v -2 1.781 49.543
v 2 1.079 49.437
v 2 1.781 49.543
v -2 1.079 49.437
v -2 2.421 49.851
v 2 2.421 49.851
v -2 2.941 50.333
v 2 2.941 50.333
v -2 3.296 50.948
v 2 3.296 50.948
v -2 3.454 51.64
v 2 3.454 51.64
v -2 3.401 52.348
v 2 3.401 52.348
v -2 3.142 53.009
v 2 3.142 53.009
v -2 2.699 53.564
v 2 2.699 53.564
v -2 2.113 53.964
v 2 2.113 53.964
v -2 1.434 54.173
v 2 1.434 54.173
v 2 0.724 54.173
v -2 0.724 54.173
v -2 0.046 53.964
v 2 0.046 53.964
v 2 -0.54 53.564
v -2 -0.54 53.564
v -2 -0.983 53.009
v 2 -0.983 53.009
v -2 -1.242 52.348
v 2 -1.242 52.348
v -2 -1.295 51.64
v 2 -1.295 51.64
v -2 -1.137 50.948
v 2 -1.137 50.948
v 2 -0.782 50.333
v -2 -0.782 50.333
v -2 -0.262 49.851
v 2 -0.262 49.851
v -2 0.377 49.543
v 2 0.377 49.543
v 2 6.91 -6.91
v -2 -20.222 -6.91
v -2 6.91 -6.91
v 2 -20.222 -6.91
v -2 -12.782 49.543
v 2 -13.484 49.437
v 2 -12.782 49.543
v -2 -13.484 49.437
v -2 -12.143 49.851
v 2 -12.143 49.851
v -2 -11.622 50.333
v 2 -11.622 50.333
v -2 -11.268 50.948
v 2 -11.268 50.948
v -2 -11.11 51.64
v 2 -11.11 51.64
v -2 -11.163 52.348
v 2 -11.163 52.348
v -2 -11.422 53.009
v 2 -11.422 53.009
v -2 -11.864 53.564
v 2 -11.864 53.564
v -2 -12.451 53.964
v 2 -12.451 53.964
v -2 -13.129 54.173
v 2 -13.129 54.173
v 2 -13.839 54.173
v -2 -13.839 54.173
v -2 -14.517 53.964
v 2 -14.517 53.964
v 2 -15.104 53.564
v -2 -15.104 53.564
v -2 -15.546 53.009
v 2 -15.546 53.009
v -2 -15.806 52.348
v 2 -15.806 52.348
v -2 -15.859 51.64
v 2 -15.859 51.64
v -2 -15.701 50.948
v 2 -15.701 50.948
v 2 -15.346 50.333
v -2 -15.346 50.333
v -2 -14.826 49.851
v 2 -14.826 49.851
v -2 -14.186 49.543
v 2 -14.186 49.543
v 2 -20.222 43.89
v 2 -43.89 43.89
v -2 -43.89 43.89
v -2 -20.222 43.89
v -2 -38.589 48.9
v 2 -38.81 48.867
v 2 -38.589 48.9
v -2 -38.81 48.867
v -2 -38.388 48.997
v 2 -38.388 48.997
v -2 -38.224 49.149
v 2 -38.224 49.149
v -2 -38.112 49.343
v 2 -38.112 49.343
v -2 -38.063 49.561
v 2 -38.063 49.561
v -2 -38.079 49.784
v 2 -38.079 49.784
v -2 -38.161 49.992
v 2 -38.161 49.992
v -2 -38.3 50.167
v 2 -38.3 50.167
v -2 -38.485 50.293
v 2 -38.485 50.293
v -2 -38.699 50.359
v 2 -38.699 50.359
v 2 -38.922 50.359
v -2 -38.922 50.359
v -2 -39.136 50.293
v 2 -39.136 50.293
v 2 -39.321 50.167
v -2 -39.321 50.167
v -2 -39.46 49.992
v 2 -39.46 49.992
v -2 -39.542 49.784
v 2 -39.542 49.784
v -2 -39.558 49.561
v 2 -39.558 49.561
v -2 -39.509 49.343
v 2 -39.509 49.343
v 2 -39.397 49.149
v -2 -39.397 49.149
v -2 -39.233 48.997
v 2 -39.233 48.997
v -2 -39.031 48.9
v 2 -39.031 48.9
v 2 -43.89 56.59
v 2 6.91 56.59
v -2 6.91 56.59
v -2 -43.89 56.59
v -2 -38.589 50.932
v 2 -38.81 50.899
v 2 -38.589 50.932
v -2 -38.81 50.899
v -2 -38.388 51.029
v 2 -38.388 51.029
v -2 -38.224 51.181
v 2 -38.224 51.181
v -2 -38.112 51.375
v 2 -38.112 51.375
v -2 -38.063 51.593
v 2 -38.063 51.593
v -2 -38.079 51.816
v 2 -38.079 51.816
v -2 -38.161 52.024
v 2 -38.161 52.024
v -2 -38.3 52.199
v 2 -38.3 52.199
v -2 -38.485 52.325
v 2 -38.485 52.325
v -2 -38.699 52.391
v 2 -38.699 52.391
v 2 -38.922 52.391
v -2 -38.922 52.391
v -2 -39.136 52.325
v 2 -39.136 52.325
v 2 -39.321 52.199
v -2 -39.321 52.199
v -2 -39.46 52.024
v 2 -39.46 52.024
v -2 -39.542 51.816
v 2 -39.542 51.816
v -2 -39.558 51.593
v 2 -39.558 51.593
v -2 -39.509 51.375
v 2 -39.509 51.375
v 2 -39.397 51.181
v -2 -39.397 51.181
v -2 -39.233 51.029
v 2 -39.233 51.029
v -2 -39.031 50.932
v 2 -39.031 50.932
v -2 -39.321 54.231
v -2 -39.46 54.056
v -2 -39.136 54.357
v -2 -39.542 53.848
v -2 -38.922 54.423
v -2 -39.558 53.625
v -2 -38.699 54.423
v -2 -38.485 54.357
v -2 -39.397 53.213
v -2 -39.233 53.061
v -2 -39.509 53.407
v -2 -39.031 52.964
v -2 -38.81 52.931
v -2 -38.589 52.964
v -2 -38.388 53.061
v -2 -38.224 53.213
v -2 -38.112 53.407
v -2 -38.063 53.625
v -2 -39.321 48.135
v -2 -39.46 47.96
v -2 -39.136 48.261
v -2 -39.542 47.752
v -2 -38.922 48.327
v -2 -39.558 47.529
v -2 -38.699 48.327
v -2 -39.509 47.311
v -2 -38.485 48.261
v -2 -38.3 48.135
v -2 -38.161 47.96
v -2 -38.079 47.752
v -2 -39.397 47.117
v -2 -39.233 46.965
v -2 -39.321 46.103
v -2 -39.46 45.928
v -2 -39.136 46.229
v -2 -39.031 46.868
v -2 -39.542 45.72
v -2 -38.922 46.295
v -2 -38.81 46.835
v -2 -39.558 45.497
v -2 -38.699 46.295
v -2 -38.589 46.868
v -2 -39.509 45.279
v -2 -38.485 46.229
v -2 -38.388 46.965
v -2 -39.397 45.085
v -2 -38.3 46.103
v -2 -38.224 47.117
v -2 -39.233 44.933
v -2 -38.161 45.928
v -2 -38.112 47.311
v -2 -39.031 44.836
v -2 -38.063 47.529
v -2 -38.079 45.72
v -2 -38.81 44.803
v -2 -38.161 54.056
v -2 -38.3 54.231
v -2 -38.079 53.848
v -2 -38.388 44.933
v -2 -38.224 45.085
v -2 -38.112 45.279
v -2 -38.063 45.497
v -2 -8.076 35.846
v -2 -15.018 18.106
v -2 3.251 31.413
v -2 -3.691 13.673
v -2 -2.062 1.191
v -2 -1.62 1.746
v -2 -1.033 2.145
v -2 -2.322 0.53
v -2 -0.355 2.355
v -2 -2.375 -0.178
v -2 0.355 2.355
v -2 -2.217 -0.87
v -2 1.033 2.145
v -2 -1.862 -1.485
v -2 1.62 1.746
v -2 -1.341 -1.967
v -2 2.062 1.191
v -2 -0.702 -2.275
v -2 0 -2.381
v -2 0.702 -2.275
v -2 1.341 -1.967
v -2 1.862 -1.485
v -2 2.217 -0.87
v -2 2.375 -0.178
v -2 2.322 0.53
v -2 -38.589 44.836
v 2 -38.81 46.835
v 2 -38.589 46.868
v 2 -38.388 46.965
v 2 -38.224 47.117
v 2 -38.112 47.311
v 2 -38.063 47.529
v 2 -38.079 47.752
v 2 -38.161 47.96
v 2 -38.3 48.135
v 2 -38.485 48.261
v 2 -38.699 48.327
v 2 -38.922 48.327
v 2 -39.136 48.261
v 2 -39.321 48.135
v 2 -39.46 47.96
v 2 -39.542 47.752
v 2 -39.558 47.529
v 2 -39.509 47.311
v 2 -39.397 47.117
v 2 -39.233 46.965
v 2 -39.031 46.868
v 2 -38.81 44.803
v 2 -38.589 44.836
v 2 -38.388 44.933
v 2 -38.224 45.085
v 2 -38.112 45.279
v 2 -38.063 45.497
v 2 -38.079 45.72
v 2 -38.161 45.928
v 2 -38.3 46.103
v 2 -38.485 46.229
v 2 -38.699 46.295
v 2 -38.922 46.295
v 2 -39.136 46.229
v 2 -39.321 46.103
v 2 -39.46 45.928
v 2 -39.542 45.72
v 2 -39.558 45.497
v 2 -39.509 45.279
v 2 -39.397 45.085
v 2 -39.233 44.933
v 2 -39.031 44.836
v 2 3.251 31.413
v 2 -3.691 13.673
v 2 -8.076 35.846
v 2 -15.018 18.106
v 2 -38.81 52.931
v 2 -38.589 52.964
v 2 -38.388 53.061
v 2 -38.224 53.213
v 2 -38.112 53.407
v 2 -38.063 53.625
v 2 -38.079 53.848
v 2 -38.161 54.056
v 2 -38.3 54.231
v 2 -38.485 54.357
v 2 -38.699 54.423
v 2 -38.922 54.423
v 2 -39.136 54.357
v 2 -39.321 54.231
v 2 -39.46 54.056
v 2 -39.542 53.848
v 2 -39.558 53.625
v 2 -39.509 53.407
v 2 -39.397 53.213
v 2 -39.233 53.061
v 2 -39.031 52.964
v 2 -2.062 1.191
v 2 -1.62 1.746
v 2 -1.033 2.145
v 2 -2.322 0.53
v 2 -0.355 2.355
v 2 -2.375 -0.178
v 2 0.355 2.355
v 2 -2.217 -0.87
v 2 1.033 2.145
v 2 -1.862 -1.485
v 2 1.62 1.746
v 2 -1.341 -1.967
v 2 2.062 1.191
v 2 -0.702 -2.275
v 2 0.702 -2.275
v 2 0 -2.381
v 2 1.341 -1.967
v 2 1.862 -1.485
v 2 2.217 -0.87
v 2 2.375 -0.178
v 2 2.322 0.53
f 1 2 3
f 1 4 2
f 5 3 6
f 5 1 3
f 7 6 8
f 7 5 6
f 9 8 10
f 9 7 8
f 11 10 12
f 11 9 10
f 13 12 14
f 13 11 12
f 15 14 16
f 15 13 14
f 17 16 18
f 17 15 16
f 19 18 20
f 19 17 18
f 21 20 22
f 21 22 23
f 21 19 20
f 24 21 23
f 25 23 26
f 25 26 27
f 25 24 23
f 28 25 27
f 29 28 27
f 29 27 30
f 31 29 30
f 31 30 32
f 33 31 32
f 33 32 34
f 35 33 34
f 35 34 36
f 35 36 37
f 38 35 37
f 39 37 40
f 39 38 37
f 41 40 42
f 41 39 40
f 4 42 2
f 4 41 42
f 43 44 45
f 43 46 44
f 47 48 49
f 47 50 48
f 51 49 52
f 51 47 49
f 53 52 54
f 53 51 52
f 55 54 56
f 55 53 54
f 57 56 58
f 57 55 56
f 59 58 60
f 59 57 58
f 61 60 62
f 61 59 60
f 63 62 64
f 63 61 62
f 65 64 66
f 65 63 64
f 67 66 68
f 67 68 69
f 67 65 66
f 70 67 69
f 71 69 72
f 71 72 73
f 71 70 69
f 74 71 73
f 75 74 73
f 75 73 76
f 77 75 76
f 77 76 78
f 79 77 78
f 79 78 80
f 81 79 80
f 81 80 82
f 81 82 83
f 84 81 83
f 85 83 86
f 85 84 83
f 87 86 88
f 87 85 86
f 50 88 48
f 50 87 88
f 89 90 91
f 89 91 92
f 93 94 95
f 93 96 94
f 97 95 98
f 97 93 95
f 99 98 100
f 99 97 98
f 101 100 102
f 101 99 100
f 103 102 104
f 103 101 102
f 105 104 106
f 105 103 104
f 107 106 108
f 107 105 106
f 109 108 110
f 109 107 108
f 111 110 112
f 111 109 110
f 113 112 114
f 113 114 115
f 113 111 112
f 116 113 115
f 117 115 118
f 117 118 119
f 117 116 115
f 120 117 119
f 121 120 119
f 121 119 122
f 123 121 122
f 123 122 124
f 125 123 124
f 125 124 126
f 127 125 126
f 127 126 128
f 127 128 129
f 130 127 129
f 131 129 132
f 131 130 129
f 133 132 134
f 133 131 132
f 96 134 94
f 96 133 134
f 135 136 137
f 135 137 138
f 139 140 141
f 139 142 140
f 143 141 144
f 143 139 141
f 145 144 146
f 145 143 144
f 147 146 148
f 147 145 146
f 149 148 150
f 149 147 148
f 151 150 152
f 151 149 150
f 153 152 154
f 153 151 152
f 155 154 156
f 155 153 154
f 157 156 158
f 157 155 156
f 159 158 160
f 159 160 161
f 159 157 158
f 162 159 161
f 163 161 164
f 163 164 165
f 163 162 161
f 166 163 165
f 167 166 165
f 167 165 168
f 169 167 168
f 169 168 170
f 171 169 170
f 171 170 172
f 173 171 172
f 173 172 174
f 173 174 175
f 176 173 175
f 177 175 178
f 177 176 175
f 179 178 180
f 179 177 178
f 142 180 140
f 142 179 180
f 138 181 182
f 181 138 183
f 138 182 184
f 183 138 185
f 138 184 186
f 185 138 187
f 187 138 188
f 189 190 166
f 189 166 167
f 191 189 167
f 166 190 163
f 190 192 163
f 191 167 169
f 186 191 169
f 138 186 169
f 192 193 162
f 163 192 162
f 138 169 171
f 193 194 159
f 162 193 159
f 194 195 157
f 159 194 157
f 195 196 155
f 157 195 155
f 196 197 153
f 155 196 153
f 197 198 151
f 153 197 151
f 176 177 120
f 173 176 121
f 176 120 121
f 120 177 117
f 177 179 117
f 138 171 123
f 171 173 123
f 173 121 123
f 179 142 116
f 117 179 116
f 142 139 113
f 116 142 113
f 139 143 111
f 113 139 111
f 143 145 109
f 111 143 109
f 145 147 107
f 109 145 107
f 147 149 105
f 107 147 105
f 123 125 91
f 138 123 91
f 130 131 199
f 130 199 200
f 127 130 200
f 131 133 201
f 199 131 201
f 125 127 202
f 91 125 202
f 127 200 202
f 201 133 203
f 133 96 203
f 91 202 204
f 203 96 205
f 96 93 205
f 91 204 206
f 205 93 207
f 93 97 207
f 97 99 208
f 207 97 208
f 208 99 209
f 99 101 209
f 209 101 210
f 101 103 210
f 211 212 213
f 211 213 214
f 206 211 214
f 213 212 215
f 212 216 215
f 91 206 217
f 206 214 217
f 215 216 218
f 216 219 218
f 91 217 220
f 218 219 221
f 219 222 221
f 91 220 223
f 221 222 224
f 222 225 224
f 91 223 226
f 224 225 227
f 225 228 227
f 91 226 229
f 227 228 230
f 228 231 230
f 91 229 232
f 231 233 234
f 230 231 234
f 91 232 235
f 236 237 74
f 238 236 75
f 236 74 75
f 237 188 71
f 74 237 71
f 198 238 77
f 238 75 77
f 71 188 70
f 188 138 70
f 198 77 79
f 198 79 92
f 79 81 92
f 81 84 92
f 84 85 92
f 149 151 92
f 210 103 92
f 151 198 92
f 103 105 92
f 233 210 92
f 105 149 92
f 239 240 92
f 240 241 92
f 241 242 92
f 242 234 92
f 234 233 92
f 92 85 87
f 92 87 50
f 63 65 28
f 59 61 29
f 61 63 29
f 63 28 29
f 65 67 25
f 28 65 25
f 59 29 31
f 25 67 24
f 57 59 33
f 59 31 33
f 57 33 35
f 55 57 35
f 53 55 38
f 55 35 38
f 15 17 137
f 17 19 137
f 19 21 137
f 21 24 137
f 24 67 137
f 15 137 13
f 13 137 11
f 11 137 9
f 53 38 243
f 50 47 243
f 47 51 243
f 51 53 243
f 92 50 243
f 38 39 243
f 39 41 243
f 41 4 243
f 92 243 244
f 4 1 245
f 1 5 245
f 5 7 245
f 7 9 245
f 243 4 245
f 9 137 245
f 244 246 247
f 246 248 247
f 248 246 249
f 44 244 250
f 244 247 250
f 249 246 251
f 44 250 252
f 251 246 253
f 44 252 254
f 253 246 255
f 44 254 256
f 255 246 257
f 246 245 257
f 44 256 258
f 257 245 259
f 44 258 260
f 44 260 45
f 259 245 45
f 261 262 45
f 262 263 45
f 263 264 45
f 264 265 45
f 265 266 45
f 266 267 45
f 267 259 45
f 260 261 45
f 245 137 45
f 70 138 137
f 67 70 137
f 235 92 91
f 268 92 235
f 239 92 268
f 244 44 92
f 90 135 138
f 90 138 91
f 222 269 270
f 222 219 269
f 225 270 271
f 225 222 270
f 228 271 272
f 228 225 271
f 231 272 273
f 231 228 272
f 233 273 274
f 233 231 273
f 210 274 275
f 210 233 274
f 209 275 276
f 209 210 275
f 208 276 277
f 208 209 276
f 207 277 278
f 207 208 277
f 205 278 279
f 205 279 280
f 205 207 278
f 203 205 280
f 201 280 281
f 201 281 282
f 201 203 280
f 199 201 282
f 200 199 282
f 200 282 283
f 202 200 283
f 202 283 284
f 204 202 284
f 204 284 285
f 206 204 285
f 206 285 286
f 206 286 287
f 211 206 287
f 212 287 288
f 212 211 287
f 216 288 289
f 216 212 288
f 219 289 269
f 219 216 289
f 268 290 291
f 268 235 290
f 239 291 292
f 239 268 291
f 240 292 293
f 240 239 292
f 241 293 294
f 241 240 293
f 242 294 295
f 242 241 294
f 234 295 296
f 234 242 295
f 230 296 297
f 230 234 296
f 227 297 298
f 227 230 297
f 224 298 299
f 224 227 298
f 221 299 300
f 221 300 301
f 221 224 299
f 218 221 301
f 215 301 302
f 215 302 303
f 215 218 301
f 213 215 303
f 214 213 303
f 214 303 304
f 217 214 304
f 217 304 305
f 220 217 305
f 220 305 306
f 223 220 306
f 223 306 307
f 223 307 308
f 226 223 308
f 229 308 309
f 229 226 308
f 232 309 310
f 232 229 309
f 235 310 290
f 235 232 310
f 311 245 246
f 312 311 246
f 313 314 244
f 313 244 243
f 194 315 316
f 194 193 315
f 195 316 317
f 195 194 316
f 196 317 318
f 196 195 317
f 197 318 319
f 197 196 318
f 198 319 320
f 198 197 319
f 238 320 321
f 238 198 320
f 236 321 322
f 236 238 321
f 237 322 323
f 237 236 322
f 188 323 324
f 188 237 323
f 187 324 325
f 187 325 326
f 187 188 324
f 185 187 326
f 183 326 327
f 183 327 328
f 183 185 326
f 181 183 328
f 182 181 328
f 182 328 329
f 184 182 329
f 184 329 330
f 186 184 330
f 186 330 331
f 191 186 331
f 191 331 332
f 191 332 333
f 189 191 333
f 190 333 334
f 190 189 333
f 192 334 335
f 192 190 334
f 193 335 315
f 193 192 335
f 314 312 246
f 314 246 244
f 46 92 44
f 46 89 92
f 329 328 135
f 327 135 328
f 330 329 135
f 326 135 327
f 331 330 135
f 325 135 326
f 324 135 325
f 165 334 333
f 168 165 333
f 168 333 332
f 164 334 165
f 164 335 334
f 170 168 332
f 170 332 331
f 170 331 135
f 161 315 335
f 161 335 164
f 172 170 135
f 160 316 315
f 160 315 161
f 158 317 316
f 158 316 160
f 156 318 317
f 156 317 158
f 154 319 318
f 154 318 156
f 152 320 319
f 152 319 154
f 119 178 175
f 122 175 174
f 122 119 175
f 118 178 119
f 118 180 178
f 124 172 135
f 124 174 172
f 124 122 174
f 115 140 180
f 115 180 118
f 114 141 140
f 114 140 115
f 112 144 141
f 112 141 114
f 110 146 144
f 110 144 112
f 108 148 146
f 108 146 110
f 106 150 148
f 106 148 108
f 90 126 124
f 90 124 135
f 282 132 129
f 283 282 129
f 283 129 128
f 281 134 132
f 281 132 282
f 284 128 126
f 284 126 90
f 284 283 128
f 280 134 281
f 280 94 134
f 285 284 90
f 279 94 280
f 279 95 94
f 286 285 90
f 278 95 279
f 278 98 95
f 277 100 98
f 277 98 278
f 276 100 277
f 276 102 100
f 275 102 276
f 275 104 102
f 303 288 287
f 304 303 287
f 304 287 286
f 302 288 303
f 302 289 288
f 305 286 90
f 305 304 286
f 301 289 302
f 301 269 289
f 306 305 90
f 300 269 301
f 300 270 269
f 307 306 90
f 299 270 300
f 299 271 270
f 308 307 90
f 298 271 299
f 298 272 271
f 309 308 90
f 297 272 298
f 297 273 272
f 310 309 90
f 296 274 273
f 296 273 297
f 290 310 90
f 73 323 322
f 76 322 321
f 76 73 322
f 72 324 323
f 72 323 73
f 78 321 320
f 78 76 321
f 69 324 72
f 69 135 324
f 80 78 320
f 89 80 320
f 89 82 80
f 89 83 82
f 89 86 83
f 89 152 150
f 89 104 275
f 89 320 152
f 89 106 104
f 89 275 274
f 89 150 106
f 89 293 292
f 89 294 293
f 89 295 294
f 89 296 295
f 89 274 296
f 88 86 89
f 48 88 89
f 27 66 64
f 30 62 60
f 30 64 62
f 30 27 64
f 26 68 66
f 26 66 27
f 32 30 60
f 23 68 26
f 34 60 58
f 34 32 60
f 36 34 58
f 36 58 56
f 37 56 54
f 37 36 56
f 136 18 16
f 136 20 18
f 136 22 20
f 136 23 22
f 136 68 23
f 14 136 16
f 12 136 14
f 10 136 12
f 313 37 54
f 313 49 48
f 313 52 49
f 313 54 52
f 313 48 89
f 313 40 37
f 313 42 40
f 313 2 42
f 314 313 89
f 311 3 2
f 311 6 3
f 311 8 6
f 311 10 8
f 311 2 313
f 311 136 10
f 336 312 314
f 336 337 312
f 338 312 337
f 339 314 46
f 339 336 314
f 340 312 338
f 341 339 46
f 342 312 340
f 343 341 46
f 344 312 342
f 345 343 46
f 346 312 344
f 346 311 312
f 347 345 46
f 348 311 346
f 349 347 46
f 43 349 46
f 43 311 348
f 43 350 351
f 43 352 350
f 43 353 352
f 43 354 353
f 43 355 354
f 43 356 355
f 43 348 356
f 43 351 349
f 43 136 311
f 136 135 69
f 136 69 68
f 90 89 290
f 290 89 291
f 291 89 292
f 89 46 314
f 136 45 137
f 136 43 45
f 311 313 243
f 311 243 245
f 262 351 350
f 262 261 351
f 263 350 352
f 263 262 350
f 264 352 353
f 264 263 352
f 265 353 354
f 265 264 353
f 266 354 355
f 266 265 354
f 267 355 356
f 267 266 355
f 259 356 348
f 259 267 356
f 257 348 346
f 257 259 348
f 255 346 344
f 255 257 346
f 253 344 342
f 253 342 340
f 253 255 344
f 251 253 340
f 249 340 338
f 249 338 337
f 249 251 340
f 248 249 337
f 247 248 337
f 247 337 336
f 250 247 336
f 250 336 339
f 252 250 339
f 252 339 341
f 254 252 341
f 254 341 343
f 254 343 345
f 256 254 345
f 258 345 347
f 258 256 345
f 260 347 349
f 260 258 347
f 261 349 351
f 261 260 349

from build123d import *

# Parameters (mm, degrees)
SKETCH1_R           = 2.38125
SKETCH1_R_2         = 0.75
BOSS_EXTRUDE1_DEPTH = 2


with BuildPart() as part:
    # Sketch1 → Boss-Extrude1 (new, symmetric)
    with BuildSketch(Plane(origin=(0, 0, 0), x_dir=(0, 0, -1), z_dir=(1, 0, 0))):
        Polygon((6.909587278, 6.909587278), (-56.590412722, 6.909587278), (-56.590412722, -43.890412722), (-43.890412722, -43.890412722), (-43.890412722, -20.222057583), (6.909587278, -20.222057583), align=None)
        Circle(SKETCH1_R, mode=Mode.SUBTRACT)
        with Locations((-45.552958224, -38.810412722)):
            Circle(SKETCH1_R_2, mode=Mode.SUBTRACT)
        with Locations((-47.584958224, -38.810412722)):
            Circle(SKETCH1_R_2, mode=Mode.SUBTRACT)
        with Locations((-49.616958224, -38.810412722)):
            Circle(SKETCH1_R_2, mode=Mode.SUBTRACT)
        with Locations((-51.648958224, -38.810412722)):
            Circle(SKETCH1_R_2, mode=Mode.SUBTRACT)
        with Locations((-51.818112153, -13.484149416)):
            Circle(SKETCH1_R, mode=Mode.SUBTRACT)
        with Locations((-51.818112153, 1.079375692)):
            Circle(SKETCH1_R, mode=Mode.SUBTRACT)
        with Locations((-53.680958224, -38.810412722)):
            Circle(SKETCH1_R_2, mode=Mode.SUBTRACT)
        Polygon((-31.413305249, 3.250726227), (-13.673130295, -3.691081364), (-18.105513832, -15.018283734), (-35.845688785, -8.076476144), align=None, mode=Mode.SUBTRACT)
    extrude(amount=BOSS_EXTRUDE1_DEPTH, both=True)


solid = part.part
